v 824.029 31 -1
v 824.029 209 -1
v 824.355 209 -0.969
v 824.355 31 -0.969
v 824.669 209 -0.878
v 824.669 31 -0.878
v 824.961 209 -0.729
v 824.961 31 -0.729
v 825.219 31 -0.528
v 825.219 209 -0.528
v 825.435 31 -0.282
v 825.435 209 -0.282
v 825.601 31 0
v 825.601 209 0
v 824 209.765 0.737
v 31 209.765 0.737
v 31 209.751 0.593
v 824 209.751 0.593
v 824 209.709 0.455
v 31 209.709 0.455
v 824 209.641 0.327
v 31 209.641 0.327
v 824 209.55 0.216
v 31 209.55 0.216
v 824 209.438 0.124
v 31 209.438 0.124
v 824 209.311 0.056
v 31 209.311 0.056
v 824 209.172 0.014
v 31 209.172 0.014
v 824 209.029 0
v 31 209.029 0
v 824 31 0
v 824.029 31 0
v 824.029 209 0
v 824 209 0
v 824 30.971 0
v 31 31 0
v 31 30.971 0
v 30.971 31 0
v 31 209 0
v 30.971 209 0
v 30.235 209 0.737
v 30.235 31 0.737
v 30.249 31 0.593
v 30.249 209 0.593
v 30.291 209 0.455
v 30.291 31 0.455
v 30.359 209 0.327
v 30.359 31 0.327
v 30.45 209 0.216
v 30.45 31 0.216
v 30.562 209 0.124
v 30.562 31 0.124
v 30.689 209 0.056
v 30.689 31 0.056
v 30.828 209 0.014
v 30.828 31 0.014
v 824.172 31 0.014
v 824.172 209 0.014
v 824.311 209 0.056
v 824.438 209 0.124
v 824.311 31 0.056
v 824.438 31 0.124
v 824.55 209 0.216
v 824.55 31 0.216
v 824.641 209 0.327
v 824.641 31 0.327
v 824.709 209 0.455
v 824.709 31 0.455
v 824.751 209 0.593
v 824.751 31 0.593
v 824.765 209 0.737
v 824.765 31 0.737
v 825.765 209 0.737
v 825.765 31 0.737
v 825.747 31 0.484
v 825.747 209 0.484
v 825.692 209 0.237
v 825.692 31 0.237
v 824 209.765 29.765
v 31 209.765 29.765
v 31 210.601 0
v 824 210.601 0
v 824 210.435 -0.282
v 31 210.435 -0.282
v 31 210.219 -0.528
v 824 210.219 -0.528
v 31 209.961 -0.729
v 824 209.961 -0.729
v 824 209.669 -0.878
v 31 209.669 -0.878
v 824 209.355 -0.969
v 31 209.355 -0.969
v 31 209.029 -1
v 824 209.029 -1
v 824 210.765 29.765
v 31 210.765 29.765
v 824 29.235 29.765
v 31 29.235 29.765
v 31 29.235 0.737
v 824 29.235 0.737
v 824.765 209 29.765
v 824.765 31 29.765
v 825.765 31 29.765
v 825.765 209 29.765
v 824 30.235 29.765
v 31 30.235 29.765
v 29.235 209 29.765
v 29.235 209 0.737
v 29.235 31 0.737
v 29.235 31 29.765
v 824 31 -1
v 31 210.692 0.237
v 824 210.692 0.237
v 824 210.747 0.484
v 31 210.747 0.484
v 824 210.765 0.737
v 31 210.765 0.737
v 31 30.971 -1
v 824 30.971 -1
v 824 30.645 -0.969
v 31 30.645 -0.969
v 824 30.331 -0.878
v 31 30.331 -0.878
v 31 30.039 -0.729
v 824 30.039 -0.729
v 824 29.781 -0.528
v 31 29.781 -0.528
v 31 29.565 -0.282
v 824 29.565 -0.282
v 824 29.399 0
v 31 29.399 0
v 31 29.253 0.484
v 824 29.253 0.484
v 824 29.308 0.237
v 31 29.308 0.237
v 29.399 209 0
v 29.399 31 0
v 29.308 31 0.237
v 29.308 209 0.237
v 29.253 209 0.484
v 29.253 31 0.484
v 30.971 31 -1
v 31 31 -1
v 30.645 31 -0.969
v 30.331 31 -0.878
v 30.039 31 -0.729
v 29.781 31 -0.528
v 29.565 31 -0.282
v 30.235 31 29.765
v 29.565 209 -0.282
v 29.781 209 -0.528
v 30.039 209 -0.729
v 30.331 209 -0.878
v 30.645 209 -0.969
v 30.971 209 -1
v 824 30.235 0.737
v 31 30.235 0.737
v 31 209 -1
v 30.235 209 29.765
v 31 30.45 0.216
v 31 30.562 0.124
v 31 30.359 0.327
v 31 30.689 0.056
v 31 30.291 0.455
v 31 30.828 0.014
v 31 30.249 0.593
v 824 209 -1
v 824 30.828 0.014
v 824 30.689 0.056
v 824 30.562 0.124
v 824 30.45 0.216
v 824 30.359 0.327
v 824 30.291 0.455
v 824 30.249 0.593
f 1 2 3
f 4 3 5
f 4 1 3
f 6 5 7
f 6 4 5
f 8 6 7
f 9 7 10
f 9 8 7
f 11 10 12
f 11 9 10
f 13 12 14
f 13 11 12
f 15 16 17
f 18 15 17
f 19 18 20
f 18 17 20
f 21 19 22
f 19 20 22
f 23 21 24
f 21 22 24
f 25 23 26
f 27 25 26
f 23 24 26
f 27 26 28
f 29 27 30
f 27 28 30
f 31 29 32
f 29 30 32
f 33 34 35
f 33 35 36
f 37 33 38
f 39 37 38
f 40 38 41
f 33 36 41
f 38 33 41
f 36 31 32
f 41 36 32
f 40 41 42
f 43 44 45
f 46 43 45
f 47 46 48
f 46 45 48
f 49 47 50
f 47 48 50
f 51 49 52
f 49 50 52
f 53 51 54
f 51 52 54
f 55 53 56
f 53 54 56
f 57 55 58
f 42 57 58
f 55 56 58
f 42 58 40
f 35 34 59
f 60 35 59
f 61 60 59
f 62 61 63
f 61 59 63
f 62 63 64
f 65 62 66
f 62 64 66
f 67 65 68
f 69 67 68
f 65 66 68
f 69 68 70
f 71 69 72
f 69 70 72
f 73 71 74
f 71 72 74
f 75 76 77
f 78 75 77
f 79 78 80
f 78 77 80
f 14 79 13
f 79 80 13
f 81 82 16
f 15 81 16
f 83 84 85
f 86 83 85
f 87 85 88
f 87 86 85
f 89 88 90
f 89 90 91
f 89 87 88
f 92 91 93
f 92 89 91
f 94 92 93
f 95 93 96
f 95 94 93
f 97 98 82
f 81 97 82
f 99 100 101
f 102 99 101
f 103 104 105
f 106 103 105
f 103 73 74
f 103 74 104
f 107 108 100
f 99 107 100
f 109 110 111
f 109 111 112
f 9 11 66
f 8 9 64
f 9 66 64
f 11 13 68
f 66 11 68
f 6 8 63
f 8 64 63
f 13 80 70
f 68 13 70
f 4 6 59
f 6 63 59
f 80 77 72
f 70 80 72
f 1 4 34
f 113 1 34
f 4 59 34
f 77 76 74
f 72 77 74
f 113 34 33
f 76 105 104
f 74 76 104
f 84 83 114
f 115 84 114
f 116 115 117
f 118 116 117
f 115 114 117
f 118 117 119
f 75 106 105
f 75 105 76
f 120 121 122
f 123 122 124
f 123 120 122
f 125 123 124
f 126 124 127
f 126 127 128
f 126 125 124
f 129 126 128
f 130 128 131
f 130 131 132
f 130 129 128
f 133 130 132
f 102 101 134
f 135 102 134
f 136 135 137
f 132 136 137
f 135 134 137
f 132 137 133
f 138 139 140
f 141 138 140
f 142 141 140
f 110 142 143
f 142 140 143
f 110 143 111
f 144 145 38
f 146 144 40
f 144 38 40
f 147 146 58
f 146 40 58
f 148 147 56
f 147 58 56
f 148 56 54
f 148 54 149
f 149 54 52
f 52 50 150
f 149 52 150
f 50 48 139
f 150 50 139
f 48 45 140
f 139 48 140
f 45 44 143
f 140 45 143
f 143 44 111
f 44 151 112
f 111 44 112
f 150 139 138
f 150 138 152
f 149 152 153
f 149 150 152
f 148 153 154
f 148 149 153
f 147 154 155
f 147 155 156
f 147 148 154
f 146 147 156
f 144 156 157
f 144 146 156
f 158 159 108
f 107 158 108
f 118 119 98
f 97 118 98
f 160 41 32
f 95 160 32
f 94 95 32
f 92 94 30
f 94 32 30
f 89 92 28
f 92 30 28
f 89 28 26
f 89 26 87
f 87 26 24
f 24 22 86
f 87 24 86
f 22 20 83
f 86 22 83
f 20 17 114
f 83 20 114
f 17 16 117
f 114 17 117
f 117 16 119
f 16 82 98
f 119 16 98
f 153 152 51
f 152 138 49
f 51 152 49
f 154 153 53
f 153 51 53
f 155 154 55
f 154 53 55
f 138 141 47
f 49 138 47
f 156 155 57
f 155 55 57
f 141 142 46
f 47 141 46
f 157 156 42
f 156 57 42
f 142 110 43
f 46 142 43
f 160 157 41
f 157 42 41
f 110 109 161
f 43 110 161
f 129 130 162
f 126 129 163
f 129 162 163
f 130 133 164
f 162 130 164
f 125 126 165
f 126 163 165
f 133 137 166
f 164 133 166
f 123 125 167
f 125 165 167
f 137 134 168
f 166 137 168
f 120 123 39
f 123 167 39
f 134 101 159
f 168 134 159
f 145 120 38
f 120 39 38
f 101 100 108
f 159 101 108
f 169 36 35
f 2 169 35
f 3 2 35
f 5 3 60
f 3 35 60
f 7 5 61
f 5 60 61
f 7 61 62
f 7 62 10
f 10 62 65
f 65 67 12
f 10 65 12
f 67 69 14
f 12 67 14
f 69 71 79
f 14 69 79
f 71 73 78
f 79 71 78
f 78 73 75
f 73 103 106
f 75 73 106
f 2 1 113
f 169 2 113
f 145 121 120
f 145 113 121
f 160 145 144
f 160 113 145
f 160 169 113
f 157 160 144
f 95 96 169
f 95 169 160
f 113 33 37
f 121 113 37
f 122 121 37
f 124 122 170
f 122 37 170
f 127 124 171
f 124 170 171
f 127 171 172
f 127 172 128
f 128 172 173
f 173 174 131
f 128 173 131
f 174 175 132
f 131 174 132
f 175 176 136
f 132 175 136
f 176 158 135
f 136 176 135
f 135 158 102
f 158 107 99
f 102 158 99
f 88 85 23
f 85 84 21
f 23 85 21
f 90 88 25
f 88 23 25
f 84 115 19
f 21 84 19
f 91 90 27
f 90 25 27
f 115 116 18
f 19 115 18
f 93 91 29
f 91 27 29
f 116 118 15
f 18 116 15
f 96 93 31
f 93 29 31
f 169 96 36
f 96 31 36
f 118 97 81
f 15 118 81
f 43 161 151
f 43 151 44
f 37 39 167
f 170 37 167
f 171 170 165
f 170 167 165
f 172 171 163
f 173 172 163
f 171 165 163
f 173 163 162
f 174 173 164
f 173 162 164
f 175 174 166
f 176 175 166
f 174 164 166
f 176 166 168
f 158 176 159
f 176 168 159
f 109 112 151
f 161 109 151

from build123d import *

# Parameters (mm, degrees)
BASE_FLANGE1_DEPTH         = 1
SKETCHED_START             = 31
SKETCHED_BEND1_DEPTH       = 178
SKETCHED_BEND1_2_DEPTH     = 793
SKETCHED_BEND1_3_OUTLINE_W = 793
SKETCHED_BEND1_3_OUTLINE_H = 1
SKETCHED_BEND1_3_DEPTH     = 29.234623369
SKETCHED_START_2           = 210.765376631
SKETCHED_BEND1_4_OUTLINE_W = 793
SKETCHED_BEND1_4_OUTLINE_H = 1
SKETCHED_BEND1_4_DEPTH     = 29.234623369
SKETCHED_BEND1_5_DEPTH     = 178
SKETCHED_BEND1_6_DEPTH     = 793
SKETCHED_BEND1_7_OUTLINE_W = 178
SKETCHED_BEND1_7_OUTLINE_H = 1
SKETCHED_BEND1_7_DEPTH     = 29.234623369
SKETCHED_START_3           = 825.765376631
SKETCHED_BEND1_8_OUTLINE_W = 178
SKETCHED_BEND1_8_OUTLINE_H = 1
SKETCHED_BEND1_8_DEPTH     = 29.234623369


# Read off the part's stored shape, not the designer's step: Sketched Bend1
# Sheet-metal steps are written as plain solids
with BuildPart() as part:
    # Sketch1 → Base-Flange1 (new body)
    with BuildSketch(Plane.XY):
        Polygon((0, 209), (31, 209), (31, 240), (824, 240), (824, 209), (855, 209), (855, 31), (824, 31), (824, 0), (31, 0), (31, 31), (0, 31), align=None)
    extrude(amount=-BASE_FLANGE1_DEPTH)

    # Sketched Bend1 outline → Sketched Bend1 (add)
    with BuildSketch(Plane(origin=(0, 0, 0), x_dir=(1, 0, 0), z_dir=(0, 1, 0)).offset(SKETCHED_START)):
        with BuildLine():
            Line((29.234623369, -0.7366), (29.234623369, -29.765376631))
            Line((29.234623369, -29.765376631), (30.234623369, -29.765376631))
            Line((30.234623369, -29.765376631), (30.234623369, -0.7366))
            ThreePointArc((30.234623369, -0.7366), (30.450368514, -0.215745145), (30.971223369, 0))
            Line((30.971223369, 0), (29.398582279, 0))
            ThreePointArc((29.398582279, 0), (29.276108612, -0.359286442), (29.234623369, -0.7366))
        make_face()
        with BuildLine():
            Line((825.601417721, 0), (824.028776631, 0))
            ThreePointArc((824.028776631, 0), (824.549631486, -0.215745145), (824.765376631, -0.7366))
            Line((824.765376631, -0.7366), (824.765376631, -29.765376631))
            Line((824.765376631, -29.765376631), (825.765376631, -29.765376631))
            Line((825.765376631, -29.765376631), (825.765376631, -0.7366))
            ThreePointArc((825.765376631, -0.7366), (825.723891388, -0.359286442), (825.601417721, 0))
        make_face()
    extrude(amount=SKETCHED_BEND1_DEPTH)

    # Sketched Bend1 2 outline → Sketched Bend1 2 (add)
    with BuildSketch(Plane.YZ.offset(SKETCHED_START)):
        with BuildLine():
            Line((209.028776631, 0), (210.601417721, 0))
            ThreePointArc((210.601417721, 0), (210.723891388, 0.359286442), (210.765376631, 0.7366))
            Line((210.765376631, 0.7366), (210.765376631, 29.765376631))
            Line((210.765376631, 29.765376631), (209.765376631, 29.765376631))
            Line((209.765376631, 29.765376631), (209.765376631, 0.7366))
            ThreePointArc((209.765376631, 0.7366), (209.549631486, 0.215745145), (209.028776631, 0))
        make_face()
        with BuildLine():
            ThreePointArc((29.234623369, 0.7366), (29.276108612, 0.359286442), (29.398582279, 0))
            Line((29.398582279, 0), (30.971223369, 0))
            ThreePointArc((30.971223369, 0), (30.450368514, 0.215745145), (30.234623369, 0.7366))
            Line((30.234623369, 0.7366), (30.234623369, 29.765376631))
            Line((30.234623369, 29.765376631), (29.234623369, 29.765376631))
            Line((29.234623369, 29.765376631), (29.234623369, 0.7366))
        make_face()
    extrude(amount=SKETCHED_BEND1_2_DEPTH)

    # Sketched Bend1 3 outline → Sketched Bend1 3 (cut)
    with BuildSketch(Plane(origin=(0, 0, 0), x_dir=(1, 0, 0), z_dir=(0, 1, 0))):
        with Locations((427.5, 0.5)):
            Rectangle(SKETCHED_BEND1_3_OUTLINE_W, SKETCHED_BEND1_3_OUTLINE_H)
    extrude(amount=SKETCHED_BEND1_3_DEPTH, mode=Mode.SUBTRACT)

    # Sketched Bend1 4 outline → Sketched Bend1 4 (cut)
    with BuildSketch(Plane(origin=(0, 0, 0), x_dir=(1, 0, 0), z_dir=(0, 1, 0)).offset(SKETCHED_START_2)):
        with Locations((427.5, 0.5)):
            Rectangle(SKETCHED_BEND1_4_OUTLINE_W, SKETCHED_BEND1_4_OUTLINE_H)
    extrude(amount=SKETCHED_BEND1_4_DEPTH, mode=Mode.SUBTRACT)

    # Sketched Bend1 5 outline → Sketched Bend1 5 (cut)
    with BuildSketch(Plane(origin=(0, 0, 0), x_dir=(1, 0, 0), z_dir=(0, 1, 0)).offset(SKETCHED_START)):
        with BuildLine():
            Line((0, 0), (29.398582279, 0))
            ThreePointArc((29.398582279, 0), (30.039397205, 0.728828115), (30.971223369, 1))
            Line((30.971223369, 1), (0, 1))
            Line((0, 1), (0, 0))
        make_face()
        with BuildLine():
            Line((855, 1), (824.028776631, 1))
            ThreePointArc((824.028776631, 1), (824.960602795, 0.728828115), (825.601417721, 0))
            Line((825.601417721, 0), (855, 0))
            Line((855, 0), (855, 1))
        make_face()
    extrude(amount=SKETCHED_BEND1_5_DEPTH, mode=Mode.SUBTRACT)

    # Sketched Bend1 6 outline → Sketched Bend1 6 (cut)
    with BuildSketch(Plane.YZ.offset(SKETCHED_START)):
        with BuildLine():
            ThreePointArc((210.601417721, 0), (209.960602795, -0.728828115), (209.028776631, -1))
            Line((209.028776631, -1), (240, -1))
            Line((240, -1), (240, 0))
            Line((240, 0), (210.601417721, 0))
        make_face()
        with BuildLine():
            Line((0, -1), (30.971223369, -1))
            ThreePointArc((30.971223369, -1), (30.039397205, -0.728828115), (29.398582279, 0))
            Line((29.398582279, 0), (0, 0))
            Line((0, 0), (0, -1))
        make_face()
    extrude(amount=SKETCHED_BEND1_6_DEPTH, mode=Mode.SUBTRACT)

    # Sketched Bend1 7 outline → Sketched Bend1 7 (cut)
    with BuildSketch(Plane.YZ):
        with Locations((120, -0.5)):
            Rectangle(SKETCHED_BEND1_7_OUTLINE_W, SKETCHED_BEND1_7_OUTLINE_H)
    extrude(amount=SKETCHED_BEND1_7_DEPTH, mode=Mode.SUBTRACT)

    # Sketched Bend1 8 outline → Sketched Bend1 8 (cut)
    with BuildSketch(Plane.YZ.offset(SKETCHED_START_3)):
        with Locations((120, -0.5)):
            Rectangle(SKETCHED_BEND1_8_OUTLINE_W, SKETCHED_BEND1_8_OUTLINE_H)
    extrude(amount=SKETCHED_BEND1_8_DEPTH, mode=Mode.SUBTRACT)


solid = part.part
